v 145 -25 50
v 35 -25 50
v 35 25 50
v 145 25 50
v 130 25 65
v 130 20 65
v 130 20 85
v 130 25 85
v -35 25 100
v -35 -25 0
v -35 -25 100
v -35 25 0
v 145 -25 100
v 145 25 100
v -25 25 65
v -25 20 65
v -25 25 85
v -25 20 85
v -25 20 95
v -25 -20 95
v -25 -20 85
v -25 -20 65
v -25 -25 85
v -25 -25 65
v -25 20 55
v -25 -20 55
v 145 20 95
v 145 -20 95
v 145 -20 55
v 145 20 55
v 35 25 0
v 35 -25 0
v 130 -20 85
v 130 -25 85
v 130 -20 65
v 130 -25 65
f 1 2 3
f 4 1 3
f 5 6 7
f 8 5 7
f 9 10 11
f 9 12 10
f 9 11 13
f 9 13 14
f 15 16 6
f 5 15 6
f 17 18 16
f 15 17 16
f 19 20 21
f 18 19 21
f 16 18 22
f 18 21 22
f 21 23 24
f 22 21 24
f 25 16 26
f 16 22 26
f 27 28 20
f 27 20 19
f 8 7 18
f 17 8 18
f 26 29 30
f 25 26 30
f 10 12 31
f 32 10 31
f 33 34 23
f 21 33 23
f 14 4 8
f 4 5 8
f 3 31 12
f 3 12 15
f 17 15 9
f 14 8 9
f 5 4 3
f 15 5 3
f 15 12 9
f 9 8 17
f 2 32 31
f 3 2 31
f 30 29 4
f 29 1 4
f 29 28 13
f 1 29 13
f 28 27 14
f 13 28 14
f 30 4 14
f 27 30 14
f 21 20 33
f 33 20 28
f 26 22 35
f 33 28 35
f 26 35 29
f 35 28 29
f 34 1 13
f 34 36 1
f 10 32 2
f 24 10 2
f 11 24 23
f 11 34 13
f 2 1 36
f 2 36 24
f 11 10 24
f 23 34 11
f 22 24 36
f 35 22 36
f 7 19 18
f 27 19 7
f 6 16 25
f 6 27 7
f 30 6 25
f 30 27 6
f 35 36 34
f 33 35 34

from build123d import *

# Parameters (mm, degrees)
CROQUIS1_W              = 70
CROQUIS1_H              = 50
SALIENTE_EXTRUIR1_DEPTH = 50
CROQUIS2_W              = 50
CROQUIS2_H              = 50
SALIENTE_EXTRUIR2_DEPTH = 180
CROQUIS3_W              = 40
CROQUIS3_H              = 40
CORTAR_EXTRUIR1_DEPTH   = 170
CORTAR_EXTRUIR2_DEPTH   = 50


with BuildPart() as part:
    # Croquis1 → Saliente-Extruir1 (new body)
    with BuildSketch(Plane.XY):
        Rectangle(CROQUIS1_W, CROQUIS1_H)
    extrude(amount=SALIENTE_EXTRUIR1_DEPTH)

    # Croquis2 → Saliente-Extruir2 (add)
    with BuildSketch(Plane.ZY.offset(35)):
        with Locations((75, 0)):
            Rectangle(CROQUIS2_W, CROQUIS2_H)
    extrude(amount=-SALIENTE_EXTRUIR2_DEPTH)

    # Croquis3 → Cortar-Extruir1 (cut)
    with BuildSketch(Plane(origin=(145, 0, 0), x_dir=(0, 0, -1), z_dir=(1, 0, 0))):
        with Locations((-75, 0)):
            Rectangle(CROQUIS3_W, CROQUIS3_H)
    extrude(amount=-CORTAR_EXTRUIR1_DEPTH, mode=Mode.SUBTRACT)

    # Croquis4 → Cortar-Extruir2 (cut)
    with BuildSketch(Plane.XZ.offset(25)):
        Polygon((60, 85), (-25, 85), (-25, 65), (60, 65), (130, 65), (130, 85), align=None)
    extrude(amount=-CORTAR_EXTRUIR2_DEPTH, mode=Mode.SUBTRACT)


solid = part.part
